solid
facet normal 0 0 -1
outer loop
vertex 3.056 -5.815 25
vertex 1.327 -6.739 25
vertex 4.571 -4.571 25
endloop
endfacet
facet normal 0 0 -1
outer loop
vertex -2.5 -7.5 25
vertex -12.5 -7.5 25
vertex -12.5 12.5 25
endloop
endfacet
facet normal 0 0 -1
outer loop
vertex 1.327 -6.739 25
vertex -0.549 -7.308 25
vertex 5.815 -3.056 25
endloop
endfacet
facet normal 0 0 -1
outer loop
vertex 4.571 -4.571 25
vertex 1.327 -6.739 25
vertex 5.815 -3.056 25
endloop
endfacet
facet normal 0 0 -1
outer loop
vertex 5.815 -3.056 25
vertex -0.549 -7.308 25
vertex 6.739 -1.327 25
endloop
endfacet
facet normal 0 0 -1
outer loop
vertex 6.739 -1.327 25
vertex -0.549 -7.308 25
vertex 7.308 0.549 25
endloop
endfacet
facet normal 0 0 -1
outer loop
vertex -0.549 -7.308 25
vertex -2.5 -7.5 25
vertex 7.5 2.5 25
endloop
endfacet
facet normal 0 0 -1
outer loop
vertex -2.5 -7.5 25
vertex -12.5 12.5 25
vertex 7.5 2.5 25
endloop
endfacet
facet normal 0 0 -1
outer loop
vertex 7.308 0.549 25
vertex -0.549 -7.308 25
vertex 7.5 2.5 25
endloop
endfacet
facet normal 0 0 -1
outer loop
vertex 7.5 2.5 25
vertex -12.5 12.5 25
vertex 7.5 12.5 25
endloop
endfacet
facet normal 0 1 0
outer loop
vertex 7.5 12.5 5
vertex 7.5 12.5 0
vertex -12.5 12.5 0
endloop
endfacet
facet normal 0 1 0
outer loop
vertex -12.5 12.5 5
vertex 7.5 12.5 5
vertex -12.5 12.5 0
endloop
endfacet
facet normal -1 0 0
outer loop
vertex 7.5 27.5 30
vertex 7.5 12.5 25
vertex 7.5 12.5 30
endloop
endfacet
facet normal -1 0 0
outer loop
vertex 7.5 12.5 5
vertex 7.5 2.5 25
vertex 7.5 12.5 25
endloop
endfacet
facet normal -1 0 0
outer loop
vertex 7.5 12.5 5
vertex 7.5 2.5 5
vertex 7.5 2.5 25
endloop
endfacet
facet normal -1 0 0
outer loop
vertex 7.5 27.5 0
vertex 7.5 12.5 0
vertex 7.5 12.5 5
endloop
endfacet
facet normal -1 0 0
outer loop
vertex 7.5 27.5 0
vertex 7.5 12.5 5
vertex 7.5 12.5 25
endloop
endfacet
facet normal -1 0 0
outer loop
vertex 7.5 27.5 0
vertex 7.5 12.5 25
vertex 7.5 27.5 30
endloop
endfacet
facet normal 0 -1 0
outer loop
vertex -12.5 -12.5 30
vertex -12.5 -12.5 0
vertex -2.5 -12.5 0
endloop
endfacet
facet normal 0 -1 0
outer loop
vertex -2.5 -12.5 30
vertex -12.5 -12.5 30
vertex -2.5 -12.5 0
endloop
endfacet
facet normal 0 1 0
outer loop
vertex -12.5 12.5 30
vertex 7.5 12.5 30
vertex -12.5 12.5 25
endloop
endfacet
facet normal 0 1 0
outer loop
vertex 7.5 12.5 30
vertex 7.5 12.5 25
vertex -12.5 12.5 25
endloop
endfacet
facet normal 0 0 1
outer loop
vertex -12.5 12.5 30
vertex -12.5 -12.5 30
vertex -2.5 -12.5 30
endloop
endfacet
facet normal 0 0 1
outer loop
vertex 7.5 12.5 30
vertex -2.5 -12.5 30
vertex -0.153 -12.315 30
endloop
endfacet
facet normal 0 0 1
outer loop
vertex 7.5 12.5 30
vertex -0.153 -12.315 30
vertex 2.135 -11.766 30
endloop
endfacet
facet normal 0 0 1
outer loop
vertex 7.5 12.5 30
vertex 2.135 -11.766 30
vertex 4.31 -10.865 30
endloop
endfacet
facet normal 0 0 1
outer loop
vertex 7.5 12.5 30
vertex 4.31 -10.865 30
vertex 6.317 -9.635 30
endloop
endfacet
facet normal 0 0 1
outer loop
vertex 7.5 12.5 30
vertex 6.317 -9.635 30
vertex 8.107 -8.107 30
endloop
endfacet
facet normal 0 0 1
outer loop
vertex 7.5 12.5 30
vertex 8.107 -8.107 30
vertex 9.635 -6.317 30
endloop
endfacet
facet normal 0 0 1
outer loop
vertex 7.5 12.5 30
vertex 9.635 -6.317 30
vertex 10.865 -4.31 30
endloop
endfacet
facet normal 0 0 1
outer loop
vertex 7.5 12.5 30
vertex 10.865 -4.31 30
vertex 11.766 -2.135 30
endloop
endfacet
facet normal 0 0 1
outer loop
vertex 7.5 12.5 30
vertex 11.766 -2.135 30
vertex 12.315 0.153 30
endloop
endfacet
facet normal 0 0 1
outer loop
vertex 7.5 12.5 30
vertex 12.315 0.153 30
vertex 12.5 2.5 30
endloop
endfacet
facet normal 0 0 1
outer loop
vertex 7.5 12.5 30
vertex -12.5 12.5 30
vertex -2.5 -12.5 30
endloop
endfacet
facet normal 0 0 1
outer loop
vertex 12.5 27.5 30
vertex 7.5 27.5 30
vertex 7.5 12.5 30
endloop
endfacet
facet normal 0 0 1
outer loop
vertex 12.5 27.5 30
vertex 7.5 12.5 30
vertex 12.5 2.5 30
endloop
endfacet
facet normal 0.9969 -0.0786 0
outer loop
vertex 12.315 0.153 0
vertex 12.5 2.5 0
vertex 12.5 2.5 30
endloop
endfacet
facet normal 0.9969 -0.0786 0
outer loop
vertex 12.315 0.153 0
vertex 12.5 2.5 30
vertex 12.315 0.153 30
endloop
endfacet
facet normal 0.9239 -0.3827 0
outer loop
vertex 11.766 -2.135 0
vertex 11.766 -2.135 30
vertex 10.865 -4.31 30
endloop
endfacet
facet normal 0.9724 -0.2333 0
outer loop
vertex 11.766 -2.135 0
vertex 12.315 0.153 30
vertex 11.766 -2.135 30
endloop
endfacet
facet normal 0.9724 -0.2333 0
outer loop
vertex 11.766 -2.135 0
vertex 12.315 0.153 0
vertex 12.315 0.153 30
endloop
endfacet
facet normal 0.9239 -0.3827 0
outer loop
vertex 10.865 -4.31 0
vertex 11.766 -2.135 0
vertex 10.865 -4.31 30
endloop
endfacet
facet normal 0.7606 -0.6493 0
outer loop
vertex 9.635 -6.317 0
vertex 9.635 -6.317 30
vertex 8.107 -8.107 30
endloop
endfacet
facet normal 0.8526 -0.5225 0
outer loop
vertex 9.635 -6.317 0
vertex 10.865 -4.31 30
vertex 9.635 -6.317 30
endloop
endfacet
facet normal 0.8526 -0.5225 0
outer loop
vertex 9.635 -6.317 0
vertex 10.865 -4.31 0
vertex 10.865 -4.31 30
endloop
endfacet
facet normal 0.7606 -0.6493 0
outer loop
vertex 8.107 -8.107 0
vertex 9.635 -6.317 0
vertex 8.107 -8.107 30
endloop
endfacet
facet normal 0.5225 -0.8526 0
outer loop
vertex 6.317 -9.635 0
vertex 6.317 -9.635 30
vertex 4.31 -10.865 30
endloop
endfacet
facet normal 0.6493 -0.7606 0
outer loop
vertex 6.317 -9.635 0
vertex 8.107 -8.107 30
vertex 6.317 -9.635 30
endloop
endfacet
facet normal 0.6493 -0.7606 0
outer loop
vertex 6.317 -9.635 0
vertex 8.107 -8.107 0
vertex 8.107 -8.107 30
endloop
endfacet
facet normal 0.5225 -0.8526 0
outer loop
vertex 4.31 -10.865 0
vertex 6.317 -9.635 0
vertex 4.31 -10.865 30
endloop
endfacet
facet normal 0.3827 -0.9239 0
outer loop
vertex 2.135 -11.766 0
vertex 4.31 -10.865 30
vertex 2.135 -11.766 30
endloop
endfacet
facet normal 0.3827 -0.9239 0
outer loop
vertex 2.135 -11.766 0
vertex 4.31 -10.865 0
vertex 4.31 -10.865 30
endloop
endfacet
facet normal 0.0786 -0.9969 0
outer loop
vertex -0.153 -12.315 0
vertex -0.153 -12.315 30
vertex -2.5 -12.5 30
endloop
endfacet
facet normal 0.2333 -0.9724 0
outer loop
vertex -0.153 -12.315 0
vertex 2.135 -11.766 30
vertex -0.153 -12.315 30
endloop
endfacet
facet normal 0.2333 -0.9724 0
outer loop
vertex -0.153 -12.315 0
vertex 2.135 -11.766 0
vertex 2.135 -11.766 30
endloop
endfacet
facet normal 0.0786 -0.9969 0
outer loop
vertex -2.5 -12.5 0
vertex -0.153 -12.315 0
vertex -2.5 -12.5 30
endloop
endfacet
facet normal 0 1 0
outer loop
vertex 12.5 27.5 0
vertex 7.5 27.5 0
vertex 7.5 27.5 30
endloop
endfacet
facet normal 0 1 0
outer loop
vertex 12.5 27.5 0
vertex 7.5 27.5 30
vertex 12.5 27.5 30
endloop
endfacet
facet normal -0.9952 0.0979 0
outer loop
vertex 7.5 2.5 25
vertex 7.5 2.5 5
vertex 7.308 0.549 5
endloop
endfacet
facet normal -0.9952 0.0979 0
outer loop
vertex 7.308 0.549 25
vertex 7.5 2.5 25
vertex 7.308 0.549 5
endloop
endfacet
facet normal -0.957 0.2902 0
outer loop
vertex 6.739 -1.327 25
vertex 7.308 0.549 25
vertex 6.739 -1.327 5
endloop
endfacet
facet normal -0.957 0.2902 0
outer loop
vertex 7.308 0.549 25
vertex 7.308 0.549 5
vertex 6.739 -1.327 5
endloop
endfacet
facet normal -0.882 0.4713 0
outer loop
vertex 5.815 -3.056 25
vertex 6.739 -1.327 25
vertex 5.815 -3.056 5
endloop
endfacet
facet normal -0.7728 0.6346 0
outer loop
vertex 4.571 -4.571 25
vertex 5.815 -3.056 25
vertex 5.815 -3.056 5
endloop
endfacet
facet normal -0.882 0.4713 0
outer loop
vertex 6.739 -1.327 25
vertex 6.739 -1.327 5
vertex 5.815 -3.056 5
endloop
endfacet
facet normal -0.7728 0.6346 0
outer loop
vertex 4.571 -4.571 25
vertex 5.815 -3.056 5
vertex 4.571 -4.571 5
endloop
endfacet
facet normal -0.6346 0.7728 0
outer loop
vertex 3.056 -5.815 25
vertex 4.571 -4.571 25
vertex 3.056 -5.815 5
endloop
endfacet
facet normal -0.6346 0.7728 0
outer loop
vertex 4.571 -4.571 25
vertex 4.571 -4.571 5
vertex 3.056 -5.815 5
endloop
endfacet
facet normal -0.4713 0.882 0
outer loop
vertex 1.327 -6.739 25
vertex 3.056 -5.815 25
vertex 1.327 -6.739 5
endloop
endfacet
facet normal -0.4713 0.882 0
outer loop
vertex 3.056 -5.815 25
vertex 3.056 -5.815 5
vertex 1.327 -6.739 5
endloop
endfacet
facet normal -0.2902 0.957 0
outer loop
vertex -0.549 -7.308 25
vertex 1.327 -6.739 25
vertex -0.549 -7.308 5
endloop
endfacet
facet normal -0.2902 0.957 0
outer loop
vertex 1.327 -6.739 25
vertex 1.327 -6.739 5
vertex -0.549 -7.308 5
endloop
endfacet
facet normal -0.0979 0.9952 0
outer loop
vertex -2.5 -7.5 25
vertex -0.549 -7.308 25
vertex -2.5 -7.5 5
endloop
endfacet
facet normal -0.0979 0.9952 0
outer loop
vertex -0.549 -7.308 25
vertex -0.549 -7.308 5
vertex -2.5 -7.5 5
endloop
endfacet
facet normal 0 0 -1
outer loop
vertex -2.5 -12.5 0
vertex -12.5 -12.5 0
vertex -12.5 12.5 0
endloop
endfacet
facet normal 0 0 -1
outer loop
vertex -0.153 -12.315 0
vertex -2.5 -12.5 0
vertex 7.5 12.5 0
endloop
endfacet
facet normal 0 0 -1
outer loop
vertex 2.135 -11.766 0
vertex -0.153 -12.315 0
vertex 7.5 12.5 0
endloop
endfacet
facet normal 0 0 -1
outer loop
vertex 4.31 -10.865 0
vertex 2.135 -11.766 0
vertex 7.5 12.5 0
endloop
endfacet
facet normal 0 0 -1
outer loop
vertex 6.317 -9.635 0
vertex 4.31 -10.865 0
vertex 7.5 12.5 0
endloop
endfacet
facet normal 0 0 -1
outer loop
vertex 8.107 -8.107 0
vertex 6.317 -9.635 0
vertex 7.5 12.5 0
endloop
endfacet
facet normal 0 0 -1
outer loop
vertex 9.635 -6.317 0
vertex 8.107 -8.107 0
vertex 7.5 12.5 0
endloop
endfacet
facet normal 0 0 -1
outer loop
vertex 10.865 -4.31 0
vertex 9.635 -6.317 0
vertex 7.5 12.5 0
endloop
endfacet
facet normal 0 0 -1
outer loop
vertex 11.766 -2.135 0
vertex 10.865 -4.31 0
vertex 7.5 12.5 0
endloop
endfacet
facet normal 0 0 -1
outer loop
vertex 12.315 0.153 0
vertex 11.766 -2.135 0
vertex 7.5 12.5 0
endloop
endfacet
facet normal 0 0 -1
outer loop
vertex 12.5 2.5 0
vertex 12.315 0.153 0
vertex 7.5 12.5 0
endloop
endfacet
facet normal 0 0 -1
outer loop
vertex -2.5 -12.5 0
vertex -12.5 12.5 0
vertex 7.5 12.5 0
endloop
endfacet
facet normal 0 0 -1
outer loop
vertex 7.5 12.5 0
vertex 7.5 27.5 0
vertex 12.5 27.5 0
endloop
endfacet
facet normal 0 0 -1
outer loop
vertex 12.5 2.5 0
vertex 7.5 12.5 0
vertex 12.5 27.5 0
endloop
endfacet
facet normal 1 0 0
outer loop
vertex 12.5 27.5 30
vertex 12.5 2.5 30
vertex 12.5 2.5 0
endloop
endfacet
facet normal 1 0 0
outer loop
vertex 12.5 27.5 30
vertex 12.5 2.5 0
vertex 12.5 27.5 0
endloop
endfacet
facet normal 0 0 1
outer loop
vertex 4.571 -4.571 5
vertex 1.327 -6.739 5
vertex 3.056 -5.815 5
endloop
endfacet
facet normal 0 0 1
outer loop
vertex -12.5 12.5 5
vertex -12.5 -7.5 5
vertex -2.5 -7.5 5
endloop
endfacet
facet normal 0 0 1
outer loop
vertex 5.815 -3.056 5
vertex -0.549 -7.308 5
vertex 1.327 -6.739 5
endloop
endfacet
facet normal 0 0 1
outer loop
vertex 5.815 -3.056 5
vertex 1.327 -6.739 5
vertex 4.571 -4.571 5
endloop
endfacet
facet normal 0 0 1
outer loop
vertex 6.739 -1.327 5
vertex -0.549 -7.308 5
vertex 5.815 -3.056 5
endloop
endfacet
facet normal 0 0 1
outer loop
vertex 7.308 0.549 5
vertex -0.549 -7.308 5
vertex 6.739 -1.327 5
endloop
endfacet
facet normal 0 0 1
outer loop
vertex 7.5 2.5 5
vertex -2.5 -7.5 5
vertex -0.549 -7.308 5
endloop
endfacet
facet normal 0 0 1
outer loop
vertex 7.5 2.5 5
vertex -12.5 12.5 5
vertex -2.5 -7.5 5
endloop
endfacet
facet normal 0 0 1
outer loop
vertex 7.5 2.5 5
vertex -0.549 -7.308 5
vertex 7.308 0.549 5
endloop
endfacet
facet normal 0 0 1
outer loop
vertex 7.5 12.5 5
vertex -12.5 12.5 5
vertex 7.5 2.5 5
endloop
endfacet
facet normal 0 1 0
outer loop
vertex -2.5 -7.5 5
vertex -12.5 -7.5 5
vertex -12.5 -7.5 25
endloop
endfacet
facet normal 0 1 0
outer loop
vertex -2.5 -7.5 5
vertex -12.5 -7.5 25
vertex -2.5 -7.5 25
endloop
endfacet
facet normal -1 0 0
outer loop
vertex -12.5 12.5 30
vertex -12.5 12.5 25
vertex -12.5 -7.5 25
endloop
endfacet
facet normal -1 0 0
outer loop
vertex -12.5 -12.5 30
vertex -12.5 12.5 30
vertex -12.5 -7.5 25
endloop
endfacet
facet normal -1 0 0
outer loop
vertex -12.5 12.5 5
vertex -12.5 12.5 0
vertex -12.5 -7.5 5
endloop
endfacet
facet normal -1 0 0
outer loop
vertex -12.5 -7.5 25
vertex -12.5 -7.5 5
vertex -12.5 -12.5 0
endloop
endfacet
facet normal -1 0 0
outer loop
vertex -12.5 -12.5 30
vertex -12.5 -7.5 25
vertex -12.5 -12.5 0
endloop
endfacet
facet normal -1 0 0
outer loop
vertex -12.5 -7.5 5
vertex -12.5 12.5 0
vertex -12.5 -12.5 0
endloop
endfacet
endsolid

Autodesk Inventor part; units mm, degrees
ref_plane "YZ Plane" through (0, 0, 0) normal (1, 0, 0) x (0, 1, 0)
ref_plane "XZ Plane" through (0, 0, 0) normal (0, 1, 0) x (-1, 0, 0)
ref_plane "XY Plane" through (0, 0, 0) normal (0, 0, 1) x (1, 0, 0)
sketch "Esboço1" plane through (0, 0, 0) normal (0, 0, 1) x (1, 0, 0)
  line L0 (-12.5, -12.5) -> (-2.5, -12.5)
  line L1 (12.5, 2.5) -> (12.5, 12.5)
  line L2 (12.5, 12.5) -> (-12.5, 12.5)
  line L3 (-12.5, 12.5) -> (-12.5, -12.5)
  line L4 (-12.5, -12.5) -> (12.5, 12.5) construction
  line L5 (12.5, -12.5) -> (-12.5, 12.5) construction
  line L6 (12.5, 12.5) -> (7.5, 12.5)
  line L7 (7.5, 12.5) -> (7.5, 27.5)
  line L8 (7.5, 27.5) -> (12.5, 27.5)
  line L9 (12.5, 27.5) -> (12.5, 12.5)
  arc A0 (-2.5, -12.5) -> (12.5, 2.5) centre (-2.5, 2.5) ccw
  point P0 (0, 0)
  dimension "d0" = 25
  dimension "d1" = 25
  dimension "d2" = 5
  dimension "d3" = 15
  dimension "d4" = 15
extrude "Extrusão1" add sketch "Esboço1" along normal blind 30
shell "Casca1" thickness 5 removed faces 2 at (0.8333, 12.5, 10) at (-12.5, 4.1667, 20)
properties part number "Servo mount"
